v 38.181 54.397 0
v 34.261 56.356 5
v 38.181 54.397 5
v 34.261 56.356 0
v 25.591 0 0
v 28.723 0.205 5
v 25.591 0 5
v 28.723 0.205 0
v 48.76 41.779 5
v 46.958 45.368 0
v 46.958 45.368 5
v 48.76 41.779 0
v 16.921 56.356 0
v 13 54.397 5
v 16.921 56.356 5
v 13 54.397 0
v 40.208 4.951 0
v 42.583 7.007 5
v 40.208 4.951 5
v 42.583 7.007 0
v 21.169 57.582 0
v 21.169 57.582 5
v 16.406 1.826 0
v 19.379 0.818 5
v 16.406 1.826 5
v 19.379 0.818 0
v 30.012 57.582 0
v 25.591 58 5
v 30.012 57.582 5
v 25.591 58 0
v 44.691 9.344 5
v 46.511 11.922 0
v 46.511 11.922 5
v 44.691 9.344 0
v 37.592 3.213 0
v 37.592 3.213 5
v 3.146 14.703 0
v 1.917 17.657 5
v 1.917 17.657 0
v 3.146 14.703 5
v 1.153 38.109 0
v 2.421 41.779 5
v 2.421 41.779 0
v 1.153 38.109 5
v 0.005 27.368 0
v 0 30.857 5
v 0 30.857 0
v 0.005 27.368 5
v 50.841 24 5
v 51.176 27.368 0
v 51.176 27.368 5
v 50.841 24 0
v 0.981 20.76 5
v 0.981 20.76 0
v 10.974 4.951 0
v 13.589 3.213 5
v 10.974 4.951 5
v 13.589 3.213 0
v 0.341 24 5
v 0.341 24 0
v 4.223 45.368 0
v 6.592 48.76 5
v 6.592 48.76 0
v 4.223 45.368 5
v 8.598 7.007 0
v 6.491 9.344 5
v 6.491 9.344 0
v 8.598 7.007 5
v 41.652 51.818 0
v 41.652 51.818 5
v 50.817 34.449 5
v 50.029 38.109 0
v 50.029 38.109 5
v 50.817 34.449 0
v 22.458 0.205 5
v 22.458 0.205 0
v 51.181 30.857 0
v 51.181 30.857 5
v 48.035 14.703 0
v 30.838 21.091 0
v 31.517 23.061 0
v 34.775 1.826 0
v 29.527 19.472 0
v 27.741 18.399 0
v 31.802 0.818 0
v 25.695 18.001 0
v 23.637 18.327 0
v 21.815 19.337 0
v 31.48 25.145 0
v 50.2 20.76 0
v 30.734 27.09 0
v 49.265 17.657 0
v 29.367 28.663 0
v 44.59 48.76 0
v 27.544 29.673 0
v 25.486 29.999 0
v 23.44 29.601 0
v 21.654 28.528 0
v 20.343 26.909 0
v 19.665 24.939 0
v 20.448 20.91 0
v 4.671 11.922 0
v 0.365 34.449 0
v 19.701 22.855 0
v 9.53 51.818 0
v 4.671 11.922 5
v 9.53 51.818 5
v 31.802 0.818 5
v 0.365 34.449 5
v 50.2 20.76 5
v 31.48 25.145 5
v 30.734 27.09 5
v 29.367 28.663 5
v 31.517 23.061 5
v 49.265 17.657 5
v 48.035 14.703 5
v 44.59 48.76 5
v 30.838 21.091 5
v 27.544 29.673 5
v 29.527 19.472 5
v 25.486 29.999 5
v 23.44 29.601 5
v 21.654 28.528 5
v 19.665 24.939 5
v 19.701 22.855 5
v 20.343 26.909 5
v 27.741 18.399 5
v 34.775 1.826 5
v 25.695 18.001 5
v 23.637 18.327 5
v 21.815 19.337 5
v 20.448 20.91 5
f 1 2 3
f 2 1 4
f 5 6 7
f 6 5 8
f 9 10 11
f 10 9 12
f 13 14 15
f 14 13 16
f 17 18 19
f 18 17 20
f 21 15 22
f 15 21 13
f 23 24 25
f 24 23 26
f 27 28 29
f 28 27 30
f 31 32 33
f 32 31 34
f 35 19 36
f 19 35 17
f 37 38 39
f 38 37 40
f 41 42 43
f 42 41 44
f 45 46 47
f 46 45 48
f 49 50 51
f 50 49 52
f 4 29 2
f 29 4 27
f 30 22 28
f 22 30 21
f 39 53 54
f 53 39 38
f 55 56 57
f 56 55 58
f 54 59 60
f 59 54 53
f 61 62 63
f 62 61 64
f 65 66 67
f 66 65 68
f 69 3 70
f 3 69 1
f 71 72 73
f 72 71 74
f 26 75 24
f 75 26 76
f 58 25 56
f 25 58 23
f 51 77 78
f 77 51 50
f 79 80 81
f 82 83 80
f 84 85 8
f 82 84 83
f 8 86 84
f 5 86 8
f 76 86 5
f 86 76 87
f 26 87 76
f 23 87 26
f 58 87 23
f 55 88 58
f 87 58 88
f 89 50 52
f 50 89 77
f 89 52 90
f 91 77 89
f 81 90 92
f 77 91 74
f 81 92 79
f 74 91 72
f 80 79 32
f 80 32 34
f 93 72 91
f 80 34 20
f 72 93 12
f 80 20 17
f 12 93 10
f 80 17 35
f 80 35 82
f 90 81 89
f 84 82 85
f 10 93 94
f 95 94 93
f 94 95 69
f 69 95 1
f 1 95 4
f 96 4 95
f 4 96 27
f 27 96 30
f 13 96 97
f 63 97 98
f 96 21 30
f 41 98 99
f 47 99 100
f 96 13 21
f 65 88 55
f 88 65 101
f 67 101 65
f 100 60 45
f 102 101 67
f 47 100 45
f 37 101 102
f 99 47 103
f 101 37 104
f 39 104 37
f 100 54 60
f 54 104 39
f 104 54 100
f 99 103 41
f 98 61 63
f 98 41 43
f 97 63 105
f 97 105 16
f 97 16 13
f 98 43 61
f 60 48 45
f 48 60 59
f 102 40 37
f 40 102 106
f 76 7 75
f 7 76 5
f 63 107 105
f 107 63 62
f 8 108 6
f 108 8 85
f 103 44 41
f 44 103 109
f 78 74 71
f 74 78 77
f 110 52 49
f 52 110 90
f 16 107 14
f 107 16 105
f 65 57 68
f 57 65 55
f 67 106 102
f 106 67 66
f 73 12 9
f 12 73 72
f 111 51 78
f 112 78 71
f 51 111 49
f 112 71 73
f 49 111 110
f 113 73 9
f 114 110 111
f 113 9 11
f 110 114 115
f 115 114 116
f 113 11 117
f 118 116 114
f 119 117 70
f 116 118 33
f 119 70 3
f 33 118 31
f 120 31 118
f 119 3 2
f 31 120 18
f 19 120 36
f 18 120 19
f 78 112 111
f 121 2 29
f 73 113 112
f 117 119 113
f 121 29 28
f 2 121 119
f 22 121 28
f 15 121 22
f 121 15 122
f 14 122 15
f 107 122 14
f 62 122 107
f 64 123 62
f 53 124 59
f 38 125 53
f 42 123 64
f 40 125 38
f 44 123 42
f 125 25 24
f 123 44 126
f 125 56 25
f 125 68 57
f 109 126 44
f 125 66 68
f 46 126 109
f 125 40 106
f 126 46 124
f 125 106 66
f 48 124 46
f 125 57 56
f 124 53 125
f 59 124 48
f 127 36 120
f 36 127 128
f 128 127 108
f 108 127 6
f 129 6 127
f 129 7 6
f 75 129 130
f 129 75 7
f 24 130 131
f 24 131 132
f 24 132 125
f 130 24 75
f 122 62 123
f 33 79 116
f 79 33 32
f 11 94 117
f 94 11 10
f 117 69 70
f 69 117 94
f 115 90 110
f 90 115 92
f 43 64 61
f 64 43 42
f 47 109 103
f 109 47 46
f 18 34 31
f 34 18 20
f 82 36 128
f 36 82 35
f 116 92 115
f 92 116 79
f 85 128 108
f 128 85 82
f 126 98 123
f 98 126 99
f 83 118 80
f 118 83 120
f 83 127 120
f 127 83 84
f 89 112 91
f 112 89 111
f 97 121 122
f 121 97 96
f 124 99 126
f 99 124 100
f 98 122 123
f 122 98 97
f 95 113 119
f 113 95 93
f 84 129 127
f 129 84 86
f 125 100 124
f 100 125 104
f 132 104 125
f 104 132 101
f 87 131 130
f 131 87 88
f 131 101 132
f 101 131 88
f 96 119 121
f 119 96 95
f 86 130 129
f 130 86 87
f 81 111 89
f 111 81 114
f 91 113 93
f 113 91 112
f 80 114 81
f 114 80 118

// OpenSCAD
$fn = 32;

// ----------------------------------------------------------------------
// Cam plate: single_lobe cam, base R24
// ----------------------------------------------------------------------

// --- parameters (mm) ---
base_r = 24;              // base circle radius
lobe_h = 10;              // cam lobe rise
bore_r = 6;               // shaft bore radius
plate_t = 5;              // plate thickness, Z (extrusion height)

profile = [[50.841, 24], [51.176, 27.368], [51.181, 30.857], [50.817, 34.449], [50.029, 38.109], [48.76, 41.779], [46.958, 45.368], [44.59, 48.76], [41.652, 51.818], [38.181, 54.397], [34.261, 56.356], [30.012, 57.582], [25.591, 58], [21.169, 57.582], [16.921, 56.356], [13, 54.397], [9.53, 51.818], [6.592, 48.76], [4.223, 45.368], [2.421, 41.779], [1.153, 38.109], [0.365, 34.449], [0, 30.857], [0.005, 27.368], [0.341, 24], [0.981, 20.76], [1.917, 17.657], [3.146, 14.703], [4.671, 11.922], [6.491, 9.344], [8.598, 7.007], [10.974, 4.951], [13.589, 3.213], [16.406, 1.826], [19.379, 0.818], [22.458, 0.205], [25.591, 0], [28.723, 0.205], [31.802, 0.818], [34.775, 1.826], [37.592, 3.213], [40.208, 4.951], [42.583, 7.007], [44.691, 9.344], [46.511, 11.922], [48.035, 14.703], [49.265, 17.657], [50.2, 20.76]];  // primary outline, 48 points, counter clockwise
void_1 = [[31.48, 25.145], [30.734, 27.09], [29.367, 28.663], [27.544, 29.673], [25.486, 29.999], [23.44, 29.601], [21.654, 28.528], [20.343, 26.909], [19.665, 24.939], [19.701, 22.855], [20.448, 20.91], [21.815, 19.337], [23.637, 18.327], [25.695, 18.001], [27.741, 18.399], [29.527, 19.472], [30.838, 21.091], [31.517, 23.061]];  // shaft bore, 18 points

// --- the one profile operation ---
difference() {
  linear_extrude(height = plate_t) polygon(points = profile);
  translate([0, 0, -1])
    linear_extrude(height = plate_t + 2) polygon(points = void_1);
}
